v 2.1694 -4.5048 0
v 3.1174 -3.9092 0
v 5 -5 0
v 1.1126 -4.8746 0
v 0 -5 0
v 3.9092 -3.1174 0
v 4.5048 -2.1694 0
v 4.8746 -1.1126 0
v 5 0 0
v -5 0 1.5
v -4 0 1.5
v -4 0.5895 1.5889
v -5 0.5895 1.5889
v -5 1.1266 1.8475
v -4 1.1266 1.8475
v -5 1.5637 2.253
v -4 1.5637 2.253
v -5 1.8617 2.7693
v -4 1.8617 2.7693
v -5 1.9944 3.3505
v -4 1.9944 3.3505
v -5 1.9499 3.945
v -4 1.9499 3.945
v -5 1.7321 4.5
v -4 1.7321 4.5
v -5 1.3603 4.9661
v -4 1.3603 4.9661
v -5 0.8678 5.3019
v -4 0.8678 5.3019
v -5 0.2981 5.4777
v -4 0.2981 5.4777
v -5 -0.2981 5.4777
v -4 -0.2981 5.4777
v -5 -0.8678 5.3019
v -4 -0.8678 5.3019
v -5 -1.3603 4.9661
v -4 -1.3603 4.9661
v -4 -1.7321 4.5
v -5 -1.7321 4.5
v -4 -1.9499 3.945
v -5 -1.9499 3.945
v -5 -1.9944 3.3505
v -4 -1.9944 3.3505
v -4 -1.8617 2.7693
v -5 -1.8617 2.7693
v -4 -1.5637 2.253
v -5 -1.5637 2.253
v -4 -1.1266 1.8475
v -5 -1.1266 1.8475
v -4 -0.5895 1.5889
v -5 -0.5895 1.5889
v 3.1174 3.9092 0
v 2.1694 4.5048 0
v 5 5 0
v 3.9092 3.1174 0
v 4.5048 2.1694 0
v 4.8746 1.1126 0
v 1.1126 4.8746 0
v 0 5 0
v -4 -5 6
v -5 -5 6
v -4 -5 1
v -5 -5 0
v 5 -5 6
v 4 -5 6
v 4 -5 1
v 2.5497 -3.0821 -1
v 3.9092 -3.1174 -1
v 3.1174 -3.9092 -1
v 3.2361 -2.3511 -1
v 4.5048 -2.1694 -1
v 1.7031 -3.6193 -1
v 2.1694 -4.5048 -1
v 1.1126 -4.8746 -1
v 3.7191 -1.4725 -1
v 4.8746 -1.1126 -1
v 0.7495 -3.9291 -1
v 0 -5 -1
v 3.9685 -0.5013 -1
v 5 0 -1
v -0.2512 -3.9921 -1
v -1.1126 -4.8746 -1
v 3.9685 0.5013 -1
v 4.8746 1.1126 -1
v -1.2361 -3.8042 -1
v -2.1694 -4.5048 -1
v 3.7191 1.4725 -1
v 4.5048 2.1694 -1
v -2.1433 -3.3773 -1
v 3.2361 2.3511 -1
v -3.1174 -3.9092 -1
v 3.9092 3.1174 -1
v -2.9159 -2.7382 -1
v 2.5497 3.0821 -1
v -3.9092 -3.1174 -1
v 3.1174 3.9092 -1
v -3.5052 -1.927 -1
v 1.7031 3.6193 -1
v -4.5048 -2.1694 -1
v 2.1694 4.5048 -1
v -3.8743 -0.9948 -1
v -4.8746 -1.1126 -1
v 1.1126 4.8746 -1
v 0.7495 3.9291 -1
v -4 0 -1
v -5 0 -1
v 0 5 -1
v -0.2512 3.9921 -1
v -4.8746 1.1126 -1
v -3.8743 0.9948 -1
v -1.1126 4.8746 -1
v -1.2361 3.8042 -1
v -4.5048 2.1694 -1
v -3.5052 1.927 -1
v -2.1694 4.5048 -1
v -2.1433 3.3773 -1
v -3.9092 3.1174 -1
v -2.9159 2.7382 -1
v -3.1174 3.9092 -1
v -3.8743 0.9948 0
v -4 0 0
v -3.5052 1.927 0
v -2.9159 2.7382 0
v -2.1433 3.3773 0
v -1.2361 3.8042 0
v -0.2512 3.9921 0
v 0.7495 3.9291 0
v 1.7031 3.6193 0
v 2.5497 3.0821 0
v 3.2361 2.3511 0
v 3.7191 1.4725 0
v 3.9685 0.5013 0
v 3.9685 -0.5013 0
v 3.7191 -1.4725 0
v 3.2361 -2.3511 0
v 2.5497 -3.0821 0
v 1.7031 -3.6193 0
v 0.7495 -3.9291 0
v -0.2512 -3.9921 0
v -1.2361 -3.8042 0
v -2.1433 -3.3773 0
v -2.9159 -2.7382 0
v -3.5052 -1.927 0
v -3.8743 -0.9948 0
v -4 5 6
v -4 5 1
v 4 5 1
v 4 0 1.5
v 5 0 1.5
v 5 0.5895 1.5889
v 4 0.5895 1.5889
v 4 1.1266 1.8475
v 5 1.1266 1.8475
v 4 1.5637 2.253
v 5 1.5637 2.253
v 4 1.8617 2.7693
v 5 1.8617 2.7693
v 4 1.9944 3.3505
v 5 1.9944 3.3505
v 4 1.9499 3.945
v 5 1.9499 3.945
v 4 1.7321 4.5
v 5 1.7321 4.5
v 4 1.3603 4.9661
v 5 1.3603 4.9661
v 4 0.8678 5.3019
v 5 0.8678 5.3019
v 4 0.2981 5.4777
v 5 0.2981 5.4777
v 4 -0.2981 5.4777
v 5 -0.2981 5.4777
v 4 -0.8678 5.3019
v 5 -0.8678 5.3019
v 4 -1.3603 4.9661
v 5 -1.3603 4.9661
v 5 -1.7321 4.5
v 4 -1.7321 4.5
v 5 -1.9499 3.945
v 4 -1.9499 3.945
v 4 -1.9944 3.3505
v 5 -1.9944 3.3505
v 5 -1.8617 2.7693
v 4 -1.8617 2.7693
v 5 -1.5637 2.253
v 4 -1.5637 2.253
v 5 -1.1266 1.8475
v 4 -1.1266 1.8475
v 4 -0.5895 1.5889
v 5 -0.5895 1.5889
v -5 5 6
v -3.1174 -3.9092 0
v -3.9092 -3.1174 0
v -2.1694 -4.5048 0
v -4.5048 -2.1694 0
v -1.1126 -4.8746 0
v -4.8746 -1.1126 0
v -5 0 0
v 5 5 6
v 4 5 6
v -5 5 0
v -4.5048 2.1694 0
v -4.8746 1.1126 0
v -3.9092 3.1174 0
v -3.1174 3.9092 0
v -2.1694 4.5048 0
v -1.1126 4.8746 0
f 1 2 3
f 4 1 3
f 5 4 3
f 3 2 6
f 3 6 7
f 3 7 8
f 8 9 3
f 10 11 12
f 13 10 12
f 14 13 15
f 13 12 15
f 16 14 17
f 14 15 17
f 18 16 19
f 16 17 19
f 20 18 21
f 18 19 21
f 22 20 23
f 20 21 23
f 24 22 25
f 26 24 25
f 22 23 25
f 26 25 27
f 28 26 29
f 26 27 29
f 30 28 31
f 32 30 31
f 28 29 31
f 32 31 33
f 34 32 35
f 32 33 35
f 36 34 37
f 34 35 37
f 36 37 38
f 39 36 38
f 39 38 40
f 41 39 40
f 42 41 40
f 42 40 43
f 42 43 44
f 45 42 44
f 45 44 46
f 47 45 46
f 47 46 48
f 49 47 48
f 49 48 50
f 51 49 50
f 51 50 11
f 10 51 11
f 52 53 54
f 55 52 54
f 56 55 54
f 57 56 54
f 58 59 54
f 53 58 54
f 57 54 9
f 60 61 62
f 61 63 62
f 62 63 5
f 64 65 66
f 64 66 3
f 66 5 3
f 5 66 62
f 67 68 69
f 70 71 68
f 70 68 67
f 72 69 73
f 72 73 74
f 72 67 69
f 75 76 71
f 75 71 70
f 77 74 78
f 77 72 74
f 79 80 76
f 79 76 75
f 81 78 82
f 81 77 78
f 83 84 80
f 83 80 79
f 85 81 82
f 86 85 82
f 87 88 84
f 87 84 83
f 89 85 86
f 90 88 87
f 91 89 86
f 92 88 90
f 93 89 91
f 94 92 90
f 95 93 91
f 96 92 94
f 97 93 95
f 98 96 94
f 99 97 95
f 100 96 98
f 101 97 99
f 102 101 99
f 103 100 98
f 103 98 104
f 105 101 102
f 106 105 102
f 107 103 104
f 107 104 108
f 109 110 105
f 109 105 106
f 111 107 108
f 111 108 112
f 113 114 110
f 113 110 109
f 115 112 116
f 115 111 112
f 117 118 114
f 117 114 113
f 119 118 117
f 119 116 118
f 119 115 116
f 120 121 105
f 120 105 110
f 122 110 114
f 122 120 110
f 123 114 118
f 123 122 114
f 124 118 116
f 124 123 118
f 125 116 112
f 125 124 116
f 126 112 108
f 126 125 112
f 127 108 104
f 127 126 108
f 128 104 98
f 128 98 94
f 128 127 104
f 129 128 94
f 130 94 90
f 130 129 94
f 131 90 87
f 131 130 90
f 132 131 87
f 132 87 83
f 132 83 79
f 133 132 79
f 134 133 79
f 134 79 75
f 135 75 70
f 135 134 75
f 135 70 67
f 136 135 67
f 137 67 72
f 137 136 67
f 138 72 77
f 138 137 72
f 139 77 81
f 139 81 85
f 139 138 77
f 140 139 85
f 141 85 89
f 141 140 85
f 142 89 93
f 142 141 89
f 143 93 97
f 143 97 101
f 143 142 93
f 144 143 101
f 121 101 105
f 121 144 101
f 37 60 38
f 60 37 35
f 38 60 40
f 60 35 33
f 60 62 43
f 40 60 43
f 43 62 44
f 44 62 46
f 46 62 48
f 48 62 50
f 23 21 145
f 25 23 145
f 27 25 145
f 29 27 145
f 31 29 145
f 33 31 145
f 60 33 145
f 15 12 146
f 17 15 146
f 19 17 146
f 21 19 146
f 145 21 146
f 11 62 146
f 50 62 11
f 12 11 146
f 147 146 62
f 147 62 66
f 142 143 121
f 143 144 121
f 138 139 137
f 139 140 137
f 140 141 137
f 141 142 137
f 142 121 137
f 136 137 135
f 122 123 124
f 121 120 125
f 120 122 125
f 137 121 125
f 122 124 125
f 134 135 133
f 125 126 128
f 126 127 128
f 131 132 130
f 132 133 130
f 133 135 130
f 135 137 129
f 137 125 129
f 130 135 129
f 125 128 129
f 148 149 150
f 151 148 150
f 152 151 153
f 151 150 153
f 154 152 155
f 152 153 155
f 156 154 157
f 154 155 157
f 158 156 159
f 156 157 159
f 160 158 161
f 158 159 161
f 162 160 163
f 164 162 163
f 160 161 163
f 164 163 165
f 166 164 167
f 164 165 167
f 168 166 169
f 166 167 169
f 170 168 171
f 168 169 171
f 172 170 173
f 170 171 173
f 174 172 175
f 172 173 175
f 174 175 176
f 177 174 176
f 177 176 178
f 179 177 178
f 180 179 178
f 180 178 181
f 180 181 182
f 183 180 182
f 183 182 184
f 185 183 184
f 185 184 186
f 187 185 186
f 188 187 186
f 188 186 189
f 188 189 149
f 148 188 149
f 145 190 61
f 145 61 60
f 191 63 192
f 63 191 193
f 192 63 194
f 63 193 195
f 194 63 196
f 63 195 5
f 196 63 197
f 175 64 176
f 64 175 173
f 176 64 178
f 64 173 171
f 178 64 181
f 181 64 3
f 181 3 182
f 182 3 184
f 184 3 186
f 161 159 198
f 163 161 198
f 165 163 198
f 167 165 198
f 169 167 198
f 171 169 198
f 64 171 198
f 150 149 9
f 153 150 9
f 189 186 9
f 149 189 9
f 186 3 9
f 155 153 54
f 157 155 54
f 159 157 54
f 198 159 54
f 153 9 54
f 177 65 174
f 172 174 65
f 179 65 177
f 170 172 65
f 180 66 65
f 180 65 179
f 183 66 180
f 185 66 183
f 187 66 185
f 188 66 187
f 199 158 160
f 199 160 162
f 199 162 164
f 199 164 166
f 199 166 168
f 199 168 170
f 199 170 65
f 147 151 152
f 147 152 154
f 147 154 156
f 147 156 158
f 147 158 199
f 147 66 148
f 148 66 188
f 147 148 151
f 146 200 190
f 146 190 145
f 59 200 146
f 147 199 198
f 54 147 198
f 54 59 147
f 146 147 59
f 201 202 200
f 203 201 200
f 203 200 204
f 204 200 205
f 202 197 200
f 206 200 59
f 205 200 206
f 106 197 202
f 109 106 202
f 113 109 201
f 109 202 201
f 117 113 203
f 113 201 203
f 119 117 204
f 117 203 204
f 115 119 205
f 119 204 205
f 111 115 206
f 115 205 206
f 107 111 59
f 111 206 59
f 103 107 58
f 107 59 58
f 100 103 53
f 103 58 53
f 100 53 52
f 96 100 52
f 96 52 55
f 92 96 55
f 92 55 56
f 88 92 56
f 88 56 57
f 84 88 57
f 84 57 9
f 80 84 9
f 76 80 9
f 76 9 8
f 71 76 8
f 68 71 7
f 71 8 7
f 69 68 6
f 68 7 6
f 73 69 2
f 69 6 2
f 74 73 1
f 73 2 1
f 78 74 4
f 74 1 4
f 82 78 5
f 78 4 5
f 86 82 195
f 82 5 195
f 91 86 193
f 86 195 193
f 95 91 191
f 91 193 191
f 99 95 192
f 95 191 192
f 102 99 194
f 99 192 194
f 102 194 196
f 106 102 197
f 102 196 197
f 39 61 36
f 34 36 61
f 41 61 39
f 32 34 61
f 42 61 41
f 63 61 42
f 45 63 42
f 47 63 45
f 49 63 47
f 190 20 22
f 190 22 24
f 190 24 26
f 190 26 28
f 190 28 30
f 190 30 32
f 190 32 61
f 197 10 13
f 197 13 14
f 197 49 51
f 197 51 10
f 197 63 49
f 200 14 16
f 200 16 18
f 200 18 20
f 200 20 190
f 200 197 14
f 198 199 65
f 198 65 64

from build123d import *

# Parameters (mm, degrees)
SKETCH1_W           = 10
SKETCH1_H           = 10
BOSS_EXTRUDE1_DEPTH = 1
SKETCH2_W           = 1
SKETCH2_H           = 10
BOSS_EXTRUDE2_DEPTH = 5
SKETCH3_R           = 2
CUT_EXTRUDE1_DEPTH  = 12
SKETCH4_R           = 5
SKETCH4_R_2         = 4
BOSS_EXTRUDE3_DEPTH = 1


with BuildPart() as part:
    # Sketch1 → Boss-Extrude1 (new body)
    with BuildSketch(Plane.XY):
        Rectangle(SKETCH1_W, SKETCH1_H)
    extrude(amount=BOSS_EXTRUDE1_DEPTH)

    # Sketch2 → Boss-Extrude2 (add)
    with BuildSketch(Plane.XY.offset(1)):
        with Locations((-4.5, 0)):
            Rectangle(SKETCH2_W, SKETCH2_H)
        with Locations((4.5, 0)):
            Rectangle(SKETCH2_W, SKETCH2_H)
    extrude(amount=BOSS_EXTRUDE2_DEPTH)

    # Sketch3 → Cut-Extrude1 (cut)
    with BuildSketch(Plane(origin=(5, 0, 0), x_dir=(0, 0, -1), z_dir=(1, 0, 0))):
        with Locations((-3.5, 0)):
            Circle(SKETCH3_R)
    extrude(amount=-CUT_EXTRUDE1_DEPTH, mode=Mode.SUBTRACT)

    # Sketch4 → Boss-Extrude3 (add)
    with BuildSketch(Plane(origin=(0, 0, 0), x_dir=(-1, 0, 0), z_dir=(0, 0, -1))):
        Circle(SKETCH4_R)
        Circle(SKETCH4_R_2, mode=Mode.SUBTRACT)
    extrude(amount=BOSS_EXTRUDE3_DEPTH)


solid = part.part
